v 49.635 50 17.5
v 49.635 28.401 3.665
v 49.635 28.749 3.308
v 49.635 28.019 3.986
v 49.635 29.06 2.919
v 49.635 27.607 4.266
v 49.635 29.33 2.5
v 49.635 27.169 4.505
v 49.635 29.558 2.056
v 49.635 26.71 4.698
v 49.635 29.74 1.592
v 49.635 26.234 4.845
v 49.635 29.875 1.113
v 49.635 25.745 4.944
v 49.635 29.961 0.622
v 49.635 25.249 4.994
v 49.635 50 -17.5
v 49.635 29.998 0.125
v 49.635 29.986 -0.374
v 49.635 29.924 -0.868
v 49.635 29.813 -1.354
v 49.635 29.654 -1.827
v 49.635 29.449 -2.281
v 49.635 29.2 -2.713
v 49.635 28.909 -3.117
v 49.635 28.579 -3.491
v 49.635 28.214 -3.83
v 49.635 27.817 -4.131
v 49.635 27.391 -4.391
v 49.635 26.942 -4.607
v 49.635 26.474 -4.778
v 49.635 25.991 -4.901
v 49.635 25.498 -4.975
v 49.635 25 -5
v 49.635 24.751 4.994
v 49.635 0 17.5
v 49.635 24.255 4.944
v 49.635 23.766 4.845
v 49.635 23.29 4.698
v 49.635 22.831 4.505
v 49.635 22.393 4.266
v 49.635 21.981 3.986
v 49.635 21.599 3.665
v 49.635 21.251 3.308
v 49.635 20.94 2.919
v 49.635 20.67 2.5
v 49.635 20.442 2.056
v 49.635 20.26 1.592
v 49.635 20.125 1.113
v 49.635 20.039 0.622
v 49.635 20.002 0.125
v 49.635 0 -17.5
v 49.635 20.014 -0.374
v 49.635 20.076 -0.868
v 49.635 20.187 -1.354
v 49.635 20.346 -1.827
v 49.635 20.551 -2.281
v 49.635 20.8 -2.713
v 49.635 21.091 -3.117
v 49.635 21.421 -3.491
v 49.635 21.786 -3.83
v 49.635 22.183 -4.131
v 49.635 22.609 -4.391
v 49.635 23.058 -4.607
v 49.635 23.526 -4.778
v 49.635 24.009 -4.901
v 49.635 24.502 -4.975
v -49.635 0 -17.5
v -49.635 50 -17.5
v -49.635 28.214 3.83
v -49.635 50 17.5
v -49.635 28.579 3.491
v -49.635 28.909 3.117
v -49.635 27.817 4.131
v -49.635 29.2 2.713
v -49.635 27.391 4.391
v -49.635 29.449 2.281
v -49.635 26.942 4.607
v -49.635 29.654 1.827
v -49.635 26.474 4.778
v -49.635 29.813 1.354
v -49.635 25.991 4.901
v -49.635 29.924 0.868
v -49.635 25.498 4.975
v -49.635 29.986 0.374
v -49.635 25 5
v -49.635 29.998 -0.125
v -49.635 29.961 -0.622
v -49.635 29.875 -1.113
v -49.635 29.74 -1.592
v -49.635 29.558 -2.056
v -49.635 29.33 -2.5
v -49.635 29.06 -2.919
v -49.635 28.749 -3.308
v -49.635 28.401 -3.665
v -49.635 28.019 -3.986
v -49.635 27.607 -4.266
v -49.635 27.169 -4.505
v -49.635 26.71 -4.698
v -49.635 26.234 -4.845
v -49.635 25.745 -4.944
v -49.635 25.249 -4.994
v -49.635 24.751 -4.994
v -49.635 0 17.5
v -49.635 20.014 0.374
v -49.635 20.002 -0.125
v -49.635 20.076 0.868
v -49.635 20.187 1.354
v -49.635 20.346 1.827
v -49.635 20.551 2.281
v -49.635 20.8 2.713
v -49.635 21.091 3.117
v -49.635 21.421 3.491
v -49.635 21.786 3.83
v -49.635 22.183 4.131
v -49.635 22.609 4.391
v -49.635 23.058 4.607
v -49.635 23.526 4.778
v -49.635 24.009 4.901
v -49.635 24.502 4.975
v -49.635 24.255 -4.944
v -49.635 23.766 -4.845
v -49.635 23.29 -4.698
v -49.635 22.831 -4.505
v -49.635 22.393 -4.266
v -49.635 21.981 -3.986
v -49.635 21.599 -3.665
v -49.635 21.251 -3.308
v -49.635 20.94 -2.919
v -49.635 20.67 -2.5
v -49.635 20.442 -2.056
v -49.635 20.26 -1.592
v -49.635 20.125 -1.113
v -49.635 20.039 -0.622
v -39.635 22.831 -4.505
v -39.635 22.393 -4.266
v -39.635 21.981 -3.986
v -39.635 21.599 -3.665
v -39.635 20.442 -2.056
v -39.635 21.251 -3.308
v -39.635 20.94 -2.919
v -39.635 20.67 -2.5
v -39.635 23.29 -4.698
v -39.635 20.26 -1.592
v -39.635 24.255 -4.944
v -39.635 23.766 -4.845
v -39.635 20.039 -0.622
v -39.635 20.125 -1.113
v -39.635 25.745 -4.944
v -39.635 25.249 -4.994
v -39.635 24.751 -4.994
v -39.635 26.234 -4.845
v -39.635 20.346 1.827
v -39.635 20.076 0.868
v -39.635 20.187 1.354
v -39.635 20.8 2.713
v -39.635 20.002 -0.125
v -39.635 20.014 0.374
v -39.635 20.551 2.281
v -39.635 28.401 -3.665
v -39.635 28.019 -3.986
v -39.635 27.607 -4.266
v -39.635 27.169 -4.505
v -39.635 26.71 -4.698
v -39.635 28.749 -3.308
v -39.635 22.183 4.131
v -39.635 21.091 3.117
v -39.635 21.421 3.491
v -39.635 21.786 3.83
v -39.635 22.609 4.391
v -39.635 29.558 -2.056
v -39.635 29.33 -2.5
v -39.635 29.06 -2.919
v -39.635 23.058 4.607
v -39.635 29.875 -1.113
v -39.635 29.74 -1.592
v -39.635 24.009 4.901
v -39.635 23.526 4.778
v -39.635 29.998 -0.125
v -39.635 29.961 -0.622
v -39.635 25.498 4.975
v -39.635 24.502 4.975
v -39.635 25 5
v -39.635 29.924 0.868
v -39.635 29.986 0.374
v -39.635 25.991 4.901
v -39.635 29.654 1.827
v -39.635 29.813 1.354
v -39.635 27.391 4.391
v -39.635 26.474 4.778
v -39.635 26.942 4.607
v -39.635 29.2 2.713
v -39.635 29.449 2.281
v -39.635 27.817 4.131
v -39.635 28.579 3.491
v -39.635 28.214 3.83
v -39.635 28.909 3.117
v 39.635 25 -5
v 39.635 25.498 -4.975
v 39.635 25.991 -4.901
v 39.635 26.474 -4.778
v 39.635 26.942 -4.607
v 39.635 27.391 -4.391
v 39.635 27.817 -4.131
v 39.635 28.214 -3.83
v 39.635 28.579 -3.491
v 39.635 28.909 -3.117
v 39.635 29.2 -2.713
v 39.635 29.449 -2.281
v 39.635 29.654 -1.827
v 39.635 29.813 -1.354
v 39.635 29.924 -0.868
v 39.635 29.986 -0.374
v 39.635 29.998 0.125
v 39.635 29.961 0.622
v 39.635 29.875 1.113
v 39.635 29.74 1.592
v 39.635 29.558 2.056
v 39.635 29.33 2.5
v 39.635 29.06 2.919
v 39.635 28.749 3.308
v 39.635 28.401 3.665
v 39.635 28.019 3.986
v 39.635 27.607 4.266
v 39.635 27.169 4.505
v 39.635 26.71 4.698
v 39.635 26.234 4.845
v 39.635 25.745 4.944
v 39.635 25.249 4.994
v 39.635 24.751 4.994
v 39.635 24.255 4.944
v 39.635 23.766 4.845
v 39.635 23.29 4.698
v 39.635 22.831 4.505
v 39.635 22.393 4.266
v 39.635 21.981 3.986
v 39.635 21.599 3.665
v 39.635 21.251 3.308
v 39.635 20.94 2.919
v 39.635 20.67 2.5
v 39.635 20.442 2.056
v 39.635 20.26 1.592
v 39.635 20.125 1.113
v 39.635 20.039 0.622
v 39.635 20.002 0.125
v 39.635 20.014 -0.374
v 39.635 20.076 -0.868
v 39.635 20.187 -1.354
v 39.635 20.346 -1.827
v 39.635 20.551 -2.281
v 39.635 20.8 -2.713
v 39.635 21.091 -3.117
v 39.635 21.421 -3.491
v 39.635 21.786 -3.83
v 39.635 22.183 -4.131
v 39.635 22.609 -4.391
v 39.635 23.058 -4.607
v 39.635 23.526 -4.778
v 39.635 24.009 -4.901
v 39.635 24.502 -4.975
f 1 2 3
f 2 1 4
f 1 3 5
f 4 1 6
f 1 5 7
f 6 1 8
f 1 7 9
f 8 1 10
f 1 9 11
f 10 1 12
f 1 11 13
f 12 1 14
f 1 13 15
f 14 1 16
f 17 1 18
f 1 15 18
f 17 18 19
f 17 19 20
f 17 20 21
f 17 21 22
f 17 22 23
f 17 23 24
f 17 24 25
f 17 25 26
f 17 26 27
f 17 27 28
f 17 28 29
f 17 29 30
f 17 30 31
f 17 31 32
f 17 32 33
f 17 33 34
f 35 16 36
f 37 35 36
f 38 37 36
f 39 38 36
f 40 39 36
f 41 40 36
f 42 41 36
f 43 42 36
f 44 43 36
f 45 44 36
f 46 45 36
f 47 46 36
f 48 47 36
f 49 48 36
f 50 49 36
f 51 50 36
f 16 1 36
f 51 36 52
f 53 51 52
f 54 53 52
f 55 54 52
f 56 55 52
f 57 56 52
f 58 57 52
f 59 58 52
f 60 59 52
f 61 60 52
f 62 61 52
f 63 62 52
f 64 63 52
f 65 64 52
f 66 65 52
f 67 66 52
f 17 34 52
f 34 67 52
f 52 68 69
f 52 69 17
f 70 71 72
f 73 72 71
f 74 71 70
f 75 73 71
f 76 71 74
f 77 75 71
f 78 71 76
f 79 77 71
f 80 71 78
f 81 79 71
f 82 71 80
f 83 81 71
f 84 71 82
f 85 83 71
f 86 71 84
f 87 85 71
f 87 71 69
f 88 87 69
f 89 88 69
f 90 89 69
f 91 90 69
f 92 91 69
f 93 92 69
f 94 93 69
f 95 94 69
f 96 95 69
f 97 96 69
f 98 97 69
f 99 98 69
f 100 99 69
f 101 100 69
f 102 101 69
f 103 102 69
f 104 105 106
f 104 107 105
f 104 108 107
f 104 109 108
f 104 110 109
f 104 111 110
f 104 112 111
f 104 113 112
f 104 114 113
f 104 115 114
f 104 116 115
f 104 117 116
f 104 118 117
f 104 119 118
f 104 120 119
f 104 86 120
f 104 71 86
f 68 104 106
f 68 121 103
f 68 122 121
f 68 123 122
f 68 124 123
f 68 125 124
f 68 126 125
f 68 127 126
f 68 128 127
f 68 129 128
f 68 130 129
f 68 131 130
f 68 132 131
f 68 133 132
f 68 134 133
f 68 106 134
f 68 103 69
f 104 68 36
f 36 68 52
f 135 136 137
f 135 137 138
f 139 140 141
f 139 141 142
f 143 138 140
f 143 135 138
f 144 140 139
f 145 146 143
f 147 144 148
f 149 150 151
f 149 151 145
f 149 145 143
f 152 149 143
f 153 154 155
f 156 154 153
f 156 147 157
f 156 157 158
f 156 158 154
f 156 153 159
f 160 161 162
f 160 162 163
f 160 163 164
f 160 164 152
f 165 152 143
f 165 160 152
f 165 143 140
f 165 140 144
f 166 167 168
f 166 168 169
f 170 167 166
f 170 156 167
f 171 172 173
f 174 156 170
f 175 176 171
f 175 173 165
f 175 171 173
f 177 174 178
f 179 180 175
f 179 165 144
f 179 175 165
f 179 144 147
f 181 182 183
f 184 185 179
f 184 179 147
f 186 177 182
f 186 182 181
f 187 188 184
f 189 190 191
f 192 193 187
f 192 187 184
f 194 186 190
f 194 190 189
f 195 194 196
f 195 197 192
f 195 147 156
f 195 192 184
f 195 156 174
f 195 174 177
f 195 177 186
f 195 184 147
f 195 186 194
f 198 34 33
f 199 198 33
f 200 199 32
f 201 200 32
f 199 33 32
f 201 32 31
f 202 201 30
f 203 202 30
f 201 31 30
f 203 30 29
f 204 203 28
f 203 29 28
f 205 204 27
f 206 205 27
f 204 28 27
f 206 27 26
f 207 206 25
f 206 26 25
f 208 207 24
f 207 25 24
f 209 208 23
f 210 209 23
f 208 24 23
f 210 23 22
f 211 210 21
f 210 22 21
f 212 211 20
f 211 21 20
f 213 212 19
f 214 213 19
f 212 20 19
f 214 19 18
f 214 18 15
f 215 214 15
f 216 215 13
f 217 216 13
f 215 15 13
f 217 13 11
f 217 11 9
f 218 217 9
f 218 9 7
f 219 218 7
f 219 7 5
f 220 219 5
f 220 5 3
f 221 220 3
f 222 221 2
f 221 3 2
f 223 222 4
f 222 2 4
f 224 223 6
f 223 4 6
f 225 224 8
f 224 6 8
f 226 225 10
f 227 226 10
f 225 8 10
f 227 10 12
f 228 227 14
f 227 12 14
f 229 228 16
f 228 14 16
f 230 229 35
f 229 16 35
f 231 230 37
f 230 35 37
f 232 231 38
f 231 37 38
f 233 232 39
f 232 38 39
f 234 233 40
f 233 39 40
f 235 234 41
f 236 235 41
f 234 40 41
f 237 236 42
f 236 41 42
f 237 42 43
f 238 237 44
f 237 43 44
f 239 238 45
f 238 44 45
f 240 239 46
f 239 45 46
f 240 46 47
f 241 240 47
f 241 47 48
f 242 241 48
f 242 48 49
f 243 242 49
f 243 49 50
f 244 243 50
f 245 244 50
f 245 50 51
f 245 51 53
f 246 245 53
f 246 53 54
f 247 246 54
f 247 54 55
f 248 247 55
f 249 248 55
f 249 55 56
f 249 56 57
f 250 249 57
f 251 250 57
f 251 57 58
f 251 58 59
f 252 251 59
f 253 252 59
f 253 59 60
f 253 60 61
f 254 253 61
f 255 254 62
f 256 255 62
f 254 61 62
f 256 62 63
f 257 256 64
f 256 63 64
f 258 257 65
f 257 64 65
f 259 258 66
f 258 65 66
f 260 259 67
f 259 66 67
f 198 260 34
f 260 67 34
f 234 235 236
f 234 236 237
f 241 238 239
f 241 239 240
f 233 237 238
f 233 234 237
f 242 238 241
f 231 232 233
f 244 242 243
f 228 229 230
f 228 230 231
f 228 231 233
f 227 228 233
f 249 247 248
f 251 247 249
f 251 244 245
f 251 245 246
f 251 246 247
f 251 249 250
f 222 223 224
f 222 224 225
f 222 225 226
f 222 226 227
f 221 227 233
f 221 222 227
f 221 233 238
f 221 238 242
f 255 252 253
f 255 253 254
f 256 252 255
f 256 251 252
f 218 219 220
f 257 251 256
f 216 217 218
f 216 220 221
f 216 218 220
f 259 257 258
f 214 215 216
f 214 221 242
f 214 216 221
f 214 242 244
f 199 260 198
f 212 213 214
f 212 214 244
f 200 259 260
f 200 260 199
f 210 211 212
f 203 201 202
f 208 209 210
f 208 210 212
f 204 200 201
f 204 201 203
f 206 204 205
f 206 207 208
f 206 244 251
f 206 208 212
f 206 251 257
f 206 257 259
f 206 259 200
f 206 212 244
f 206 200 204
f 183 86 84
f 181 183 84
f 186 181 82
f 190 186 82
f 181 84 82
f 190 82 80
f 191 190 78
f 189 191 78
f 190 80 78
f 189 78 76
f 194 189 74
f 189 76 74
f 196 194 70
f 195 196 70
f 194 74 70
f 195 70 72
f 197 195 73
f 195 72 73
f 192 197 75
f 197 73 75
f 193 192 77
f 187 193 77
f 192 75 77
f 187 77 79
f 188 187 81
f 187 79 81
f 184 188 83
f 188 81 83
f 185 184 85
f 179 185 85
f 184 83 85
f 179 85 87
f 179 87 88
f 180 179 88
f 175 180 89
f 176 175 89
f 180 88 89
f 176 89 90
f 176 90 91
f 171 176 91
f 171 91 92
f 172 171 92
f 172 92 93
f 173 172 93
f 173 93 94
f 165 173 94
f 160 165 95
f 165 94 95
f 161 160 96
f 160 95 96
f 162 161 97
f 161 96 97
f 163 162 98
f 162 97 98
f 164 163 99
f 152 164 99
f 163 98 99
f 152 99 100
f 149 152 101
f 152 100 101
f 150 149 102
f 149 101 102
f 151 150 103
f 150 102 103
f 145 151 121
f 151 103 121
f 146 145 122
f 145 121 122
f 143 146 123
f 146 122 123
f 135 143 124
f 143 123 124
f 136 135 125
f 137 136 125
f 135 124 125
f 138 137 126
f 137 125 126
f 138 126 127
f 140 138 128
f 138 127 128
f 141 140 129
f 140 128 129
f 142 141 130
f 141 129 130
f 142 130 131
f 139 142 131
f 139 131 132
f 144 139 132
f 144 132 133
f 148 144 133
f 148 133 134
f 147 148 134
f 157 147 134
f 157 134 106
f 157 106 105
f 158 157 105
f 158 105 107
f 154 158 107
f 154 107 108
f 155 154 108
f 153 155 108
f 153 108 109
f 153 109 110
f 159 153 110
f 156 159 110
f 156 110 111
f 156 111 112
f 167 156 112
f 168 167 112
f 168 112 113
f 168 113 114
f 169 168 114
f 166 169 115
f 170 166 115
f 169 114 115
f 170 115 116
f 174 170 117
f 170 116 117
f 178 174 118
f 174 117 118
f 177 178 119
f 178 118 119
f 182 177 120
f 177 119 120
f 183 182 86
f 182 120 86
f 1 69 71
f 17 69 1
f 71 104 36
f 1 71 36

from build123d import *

# Parameters (mm, degrees)
SKETCH1_W           = 99.270032964
SKETCH1_H           = 35
BOSS_EXTRUDE1_DEPTH = 50
SKETCH2_R           = 5
CUT_EXTRUDE1_DEPTH  = 10
SKETCH3_R           = 5
CUT_EXTRUDE2_DEPTH  = 10


with BuildPart() as part:
    # Sketch1 → Boss-Extrude1 (new body)
    with BuildSketch(Plane(origin=(0, 0, 0), x_dir=(1, 0, 0), z_dir=(0, 1, 0))):
        Rectangle(SKETCH1_W, SKETCH1_H)
    extrude(amount=BOSS_EXTRUDE1_DEPTH)

    # Sketch2 → Cut-Extrude1 (cut)
    with BuildSketch(Plane.ZY.offset(49.635016482)):
        with Locations((0, 25)):
            Circle(SKETCH2_R)
    extrude(amount=-CUT_EXTRUDE1_DEPTH, mode=Mode.SUBTRACT)

    # Sketch3 → Cut-Extrude2 (cut)
    with BuildSketch(Plane(origin=(49.635016482, 0, 0), x_dir=(0, 0, -1), z_dir=(1, 0, 0))):
        with Locations((0, 25)):
            Circle(SKETCH3_R)
    extrude(amount=-CUT_EXTRUDE2_DEPTH, mode=Mode.SUBTRACT)


solid = part.part
